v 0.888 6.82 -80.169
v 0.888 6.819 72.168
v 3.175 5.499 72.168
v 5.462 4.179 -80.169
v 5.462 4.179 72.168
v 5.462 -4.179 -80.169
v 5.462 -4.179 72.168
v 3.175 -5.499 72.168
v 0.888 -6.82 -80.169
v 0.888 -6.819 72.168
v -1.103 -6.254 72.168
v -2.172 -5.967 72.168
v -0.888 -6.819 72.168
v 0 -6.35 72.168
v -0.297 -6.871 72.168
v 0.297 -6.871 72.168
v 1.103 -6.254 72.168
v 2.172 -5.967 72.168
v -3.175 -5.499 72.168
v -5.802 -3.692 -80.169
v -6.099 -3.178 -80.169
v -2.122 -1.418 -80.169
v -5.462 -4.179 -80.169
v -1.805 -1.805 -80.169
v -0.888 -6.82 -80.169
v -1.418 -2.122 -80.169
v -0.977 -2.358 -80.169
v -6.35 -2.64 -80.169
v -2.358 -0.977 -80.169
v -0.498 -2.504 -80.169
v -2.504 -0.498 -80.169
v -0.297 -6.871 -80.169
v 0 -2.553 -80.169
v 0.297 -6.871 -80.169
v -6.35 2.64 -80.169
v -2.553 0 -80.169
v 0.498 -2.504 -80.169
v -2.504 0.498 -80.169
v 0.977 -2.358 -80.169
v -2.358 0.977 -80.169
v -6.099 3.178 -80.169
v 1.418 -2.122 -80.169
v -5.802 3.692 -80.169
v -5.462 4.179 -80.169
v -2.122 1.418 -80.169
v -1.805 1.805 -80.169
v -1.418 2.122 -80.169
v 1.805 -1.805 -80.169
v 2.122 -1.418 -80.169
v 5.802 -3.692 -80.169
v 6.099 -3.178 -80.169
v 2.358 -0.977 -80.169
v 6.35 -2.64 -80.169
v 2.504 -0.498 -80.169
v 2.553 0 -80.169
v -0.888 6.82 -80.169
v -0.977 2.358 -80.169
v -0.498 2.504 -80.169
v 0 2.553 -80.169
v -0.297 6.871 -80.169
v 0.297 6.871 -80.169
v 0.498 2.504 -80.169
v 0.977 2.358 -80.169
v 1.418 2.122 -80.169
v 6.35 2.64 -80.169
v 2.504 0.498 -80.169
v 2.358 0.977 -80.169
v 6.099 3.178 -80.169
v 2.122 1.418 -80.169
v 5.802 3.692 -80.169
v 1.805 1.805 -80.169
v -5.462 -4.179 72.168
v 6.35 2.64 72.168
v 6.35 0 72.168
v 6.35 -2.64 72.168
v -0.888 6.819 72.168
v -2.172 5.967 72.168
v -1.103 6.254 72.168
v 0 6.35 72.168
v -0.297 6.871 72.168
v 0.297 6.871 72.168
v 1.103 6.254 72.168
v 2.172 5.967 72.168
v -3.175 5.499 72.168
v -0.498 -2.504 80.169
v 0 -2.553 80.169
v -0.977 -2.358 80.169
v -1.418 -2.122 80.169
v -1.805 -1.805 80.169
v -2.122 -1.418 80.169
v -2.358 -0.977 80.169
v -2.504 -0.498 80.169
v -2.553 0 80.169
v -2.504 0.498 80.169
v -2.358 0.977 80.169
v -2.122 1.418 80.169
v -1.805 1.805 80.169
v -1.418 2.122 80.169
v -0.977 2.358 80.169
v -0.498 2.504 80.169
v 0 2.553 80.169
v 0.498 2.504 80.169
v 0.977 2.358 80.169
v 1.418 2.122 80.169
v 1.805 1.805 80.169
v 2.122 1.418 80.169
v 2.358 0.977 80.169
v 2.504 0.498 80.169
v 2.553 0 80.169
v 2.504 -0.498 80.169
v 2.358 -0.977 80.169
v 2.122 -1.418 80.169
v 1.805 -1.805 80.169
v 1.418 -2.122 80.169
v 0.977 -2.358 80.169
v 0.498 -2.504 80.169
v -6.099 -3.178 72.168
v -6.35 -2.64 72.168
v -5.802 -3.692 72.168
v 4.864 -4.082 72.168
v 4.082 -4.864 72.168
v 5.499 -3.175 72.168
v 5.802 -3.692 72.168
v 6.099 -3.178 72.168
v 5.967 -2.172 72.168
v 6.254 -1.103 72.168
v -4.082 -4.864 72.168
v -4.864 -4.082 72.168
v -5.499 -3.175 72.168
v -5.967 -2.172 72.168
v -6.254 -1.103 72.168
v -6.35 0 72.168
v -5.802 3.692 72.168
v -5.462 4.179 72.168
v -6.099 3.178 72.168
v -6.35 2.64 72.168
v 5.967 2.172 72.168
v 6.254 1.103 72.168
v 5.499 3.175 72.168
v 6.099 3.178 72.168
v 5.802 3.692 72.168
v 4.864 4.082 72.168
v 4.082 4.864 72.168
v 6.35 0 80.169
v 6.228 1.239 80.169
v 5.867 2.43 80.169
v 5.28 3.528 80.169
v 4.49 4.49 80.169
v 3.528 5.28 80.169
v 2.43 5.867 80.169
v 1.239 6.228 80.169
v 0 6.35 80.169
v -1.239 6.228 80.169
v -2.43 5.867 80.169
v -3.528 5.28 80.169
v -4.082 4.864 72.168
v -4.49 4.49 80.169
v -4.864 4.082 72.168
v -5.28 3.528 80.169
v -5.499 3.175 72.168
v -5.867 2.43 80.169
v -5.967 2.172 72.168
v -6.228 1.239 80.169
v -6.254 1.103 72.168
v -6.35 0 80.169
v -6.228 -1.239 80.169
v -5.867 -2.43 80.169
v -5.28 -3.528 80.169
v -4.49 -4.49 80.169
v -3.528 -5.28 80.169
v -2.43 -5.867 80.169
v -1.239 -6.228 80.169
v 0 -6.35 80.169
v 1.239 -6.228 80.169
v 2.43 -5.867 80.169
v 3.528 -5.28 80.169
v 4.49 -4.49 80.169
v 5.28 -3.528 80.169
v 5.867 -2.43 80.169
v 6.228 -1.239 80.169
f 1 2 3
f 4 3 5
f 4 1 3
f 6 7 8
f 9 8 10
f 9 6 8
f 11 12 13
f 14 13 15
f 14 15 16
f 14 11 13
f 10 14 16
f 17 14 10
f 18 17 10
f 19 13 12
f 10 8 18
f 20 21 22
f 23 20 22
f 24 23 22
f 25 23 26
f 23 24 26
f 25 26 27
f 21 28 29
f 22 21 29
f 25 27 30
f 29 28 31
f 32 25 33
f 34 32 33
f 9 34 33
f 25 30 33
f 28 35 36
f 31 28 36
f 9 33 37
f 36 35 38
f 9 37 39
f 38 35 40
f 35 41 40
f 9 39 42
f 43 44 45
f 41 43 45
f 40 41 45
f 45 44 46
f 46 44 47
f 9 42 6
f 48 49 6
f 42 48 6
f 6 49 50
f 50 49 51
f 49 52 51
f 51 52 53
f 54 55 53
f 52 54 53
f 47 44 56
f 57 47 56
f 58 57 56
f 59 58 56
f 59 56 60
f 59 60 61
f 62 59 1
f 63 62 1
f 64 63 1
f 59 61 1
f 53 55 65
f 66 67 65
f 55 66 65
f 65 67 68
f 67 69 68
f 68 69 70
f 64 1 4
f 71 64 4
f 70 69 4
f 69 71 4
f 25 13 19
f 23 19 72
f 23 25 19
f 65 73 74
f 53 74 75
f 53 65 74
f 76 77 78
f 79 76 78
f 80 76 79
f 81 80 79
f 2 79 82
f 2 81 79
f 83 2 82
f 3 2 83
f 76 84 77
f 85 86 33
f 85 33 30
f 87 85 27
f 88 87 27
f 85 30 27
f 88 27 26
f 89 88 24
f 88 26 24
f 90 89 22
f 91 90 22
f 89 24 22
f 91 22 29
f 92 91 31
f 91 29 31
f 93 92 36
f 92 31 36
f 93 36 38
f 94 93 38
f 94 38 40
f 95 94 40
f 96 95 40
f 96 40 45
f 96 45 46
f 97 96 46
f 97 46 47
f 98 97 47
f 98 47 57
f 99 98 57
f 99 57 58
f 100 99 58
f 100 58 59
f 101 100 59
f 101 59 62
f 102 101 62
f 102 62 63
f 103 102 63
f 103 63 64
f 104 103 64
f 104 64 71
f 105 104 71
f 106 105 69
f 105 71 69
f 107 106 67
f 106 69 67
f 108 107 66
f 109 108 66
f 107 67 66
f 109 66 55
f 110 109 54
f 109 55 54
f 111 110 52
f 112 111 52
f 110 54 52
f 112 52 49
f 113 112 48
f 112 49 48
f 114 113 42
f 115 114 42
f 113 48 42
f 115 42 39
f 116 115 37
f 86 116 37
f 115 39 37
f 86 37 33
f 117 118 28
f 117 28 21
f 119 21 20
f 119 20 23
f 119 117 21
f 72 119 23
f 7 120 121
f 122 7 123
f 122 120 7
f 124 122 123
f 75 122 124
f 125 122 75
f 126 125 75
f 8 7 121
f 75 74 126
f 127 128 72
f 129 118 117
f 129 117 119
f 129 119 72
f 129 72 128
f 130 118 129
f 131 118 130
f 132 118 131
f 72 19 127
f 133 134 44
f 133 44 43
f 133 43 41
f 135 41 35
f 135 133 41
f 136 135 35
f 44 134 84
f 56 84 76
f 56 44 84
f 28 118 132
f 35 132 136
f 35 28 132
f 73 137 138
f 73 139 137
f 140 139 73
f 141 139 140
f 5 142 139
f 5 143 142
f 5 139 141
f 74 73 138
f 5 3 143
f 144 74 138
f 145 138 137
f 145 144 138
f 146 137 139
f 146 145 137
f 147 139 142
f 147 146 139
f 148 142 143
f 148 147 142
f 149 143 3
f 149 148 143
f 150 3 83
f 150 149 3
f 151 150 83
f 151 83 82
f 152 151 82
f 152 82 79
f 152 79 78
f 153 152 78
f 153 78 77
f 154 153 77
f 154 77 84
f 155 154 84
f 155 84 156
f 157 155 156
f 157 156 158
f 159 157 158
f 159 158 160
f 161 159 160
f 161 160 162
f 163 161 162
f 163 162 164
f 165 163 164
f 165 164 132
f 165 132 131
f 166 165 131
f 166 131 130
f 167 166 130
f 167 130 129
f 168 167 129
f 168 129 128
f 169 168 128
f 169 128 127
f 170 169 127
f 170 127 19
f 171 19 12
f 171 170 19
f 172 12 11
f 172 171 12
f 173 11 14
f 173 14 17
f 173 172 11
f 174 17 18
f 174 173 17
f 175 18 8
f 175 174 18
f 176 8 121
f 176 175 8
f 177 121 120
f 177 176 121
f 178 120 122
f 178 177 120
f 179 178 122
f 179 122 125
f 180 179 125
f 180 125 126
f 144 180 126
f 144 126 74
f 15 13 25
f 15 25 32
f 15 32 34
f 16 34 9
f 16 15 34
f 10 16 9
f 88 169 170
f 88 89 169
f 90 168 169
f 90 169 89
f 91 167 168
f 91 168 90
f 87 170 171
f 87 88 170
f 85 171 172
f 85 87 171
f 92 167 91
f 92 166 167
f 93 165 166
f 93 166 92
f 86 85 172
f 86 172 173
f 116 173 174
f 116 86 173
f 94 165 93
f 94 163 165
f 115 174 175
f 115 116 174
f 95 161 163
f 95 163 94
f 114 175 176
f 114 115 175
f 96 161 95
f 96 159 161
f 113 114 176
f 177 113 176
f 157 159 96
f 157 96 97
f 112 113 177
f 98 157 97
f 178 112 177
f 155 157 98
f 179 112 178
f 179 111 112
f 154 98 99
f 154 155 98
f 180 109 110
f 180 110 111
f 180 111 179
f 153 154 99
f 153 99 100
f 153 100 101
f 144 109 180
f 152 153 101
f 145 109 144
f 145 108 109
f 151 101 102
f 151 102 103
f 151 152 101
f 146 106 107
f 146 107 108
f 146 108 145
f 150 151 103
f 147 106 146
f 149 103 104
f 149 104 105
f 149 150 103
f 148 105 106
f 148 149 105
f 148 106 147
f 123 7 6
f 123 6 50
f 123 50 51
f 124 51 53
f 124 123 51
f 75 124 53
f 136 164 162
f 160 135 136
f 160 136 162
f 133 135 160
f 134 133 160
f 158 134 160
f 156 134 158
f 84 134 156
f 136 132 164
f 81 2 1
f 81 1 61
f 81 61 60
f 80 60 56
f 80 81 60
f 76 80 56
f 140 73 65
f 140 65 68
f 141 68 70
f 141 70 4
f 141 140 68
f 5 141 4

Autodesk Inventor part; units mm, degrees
ref_plane "YZ Plane" through (0, 0, 0) normal (1, 0, 0) x (0, 1, 0)
ref_plane "XZ Plane" through (0, 0, 0) normal (0, 1, 0) x (-1, 0, 0)
ref_plane "XY Plane" through (0, 0, 0) normal (0, 0, 1) x (1, 0, 0)
sketch "Sketch1" plane through (0, 0, 0) normal (0, 0, 1) x (1, 0, 0)
  line L0 (-6.35, -3.6662) -> (-6.35, 3.6662)
  line L1 (-6.35, 3.6662) -> (0, 7.3323)
  line L2 (0, 7.3323) -> (6.35, 3.6662)
  line L3 (6.35, 3.6662) -> (6.35, -3.6662)
  line L4 (6.35, -3.6662) -> (0, -7.3323)
  line L5 (0, -7.3323) -> (-6.35, -3.6662)
  point P0 (0, 0)
  point P1 (0, 0)
  dimension "Size" = 12.7
extrude "Extrusion1" add sketch "Sketch1" along normal mid plane 160.3375
sketch "Sketch3" plane through (0, 0, 80.1688) normal (0, 0, 1) x (1, 0, 0)
  line L0 (-6.35, 3.6662) -> (0, 7.3323) construction
  line L1 (0, 7.3323) -> (6.35, 3.6662) construction
  line L2 (6.35, 3.6662) -> (6.35, -3.6662) construction
  line L3 (6.35, -3.6662) -> (0, -7.3323) construction
  line L4 (0, -7.3323) -> (-6.35, -3.6662) construction
  line L5 (-6.35, -3.6662) -> (-6.35, 3.6662) construction
  point P0 (0, 0)
hole "Hole1" at (0, 0, 80.1688) direction (0, 0, -1) diameter 5.1054 end through all
sketch "Sketch4" plane through (0, 0, 80.1688) normal (0, 0, 1) x (1, 0, 0)
  circle A0 centre (0, 0) radius 2.5527 construction
  line L0 (-6.35, 3.6662) -> (0, 7.3323) construction
  line L1 (0, 7.3323) -> (6.35, 3.6662) construction
  line L2 (6.35, 3.6662) -> (6.35, -3.6662) construction
  line L3 (6.35, -3.6662) -> (0, -7.3323) construction
  line L4 (0, -7.3323) -> (-6.35, -3.6662) construction
  line L5 (-6.35, -3.6662) -> (-6.35, 3.6662) construction
  circle A1 centre (0, 0) radius 6.8771
  circle A2 centre (0, 0) radius 8.89
  dimension "thunder" = 13.7541
  dimension "d16" = 17.78
extrude "Extrusion3" cut sketch "Sketch4" against normal through all
sketch "Sketch5" plane through (0, 0, 80.1688) normal (0, 0, 1) x (1, 0, 0)
  arc A0 (5.4616, -4.1791) -> (6.35, -2.6403) centre (0, 0) ccw projected
  line L0 (5.4616, -4.1791) -> (0.8884, -6.8194) projected
  arc A1 (-0.8884, -6.8194) -> (0.8884, -6.8194) centre (0, 0) ccw projected
  line L1 (-0.8884, -6.8194) -> (-5.4616, -4.1791) projected
  arc A2 (-6.35, -2.6403) -> (-5.4616, -4.1791) centre (0, 0) ccw projected
  line L2 (-6.35, -2.6403) -> (-6.35, 2.6403) projected
  arc A3 (-5.4616, 4.1791) -> (-6.35, 2.6403) centre (0, 0) ccw projected
  line L3 (-5.4616, 4.1791) -> (-0.8884, 6.8194) projected
  arc A4 (0.8884, 6.8194) -> (-0.8884, 6.8194) centre (0, 0) ccw projected
  line L4 (0.8884, 6.8194) -> (5.4616, 4.1791) projected
  arc A5 (6.35, 2.6403) -> (5.4616, 4.1791) centre (0, 0) ccw projected
  line L5 (6.35, 2.6403) -> (6.35, -2.6403) projected
  circle A6 centre (0, 0) radius 2.5527 projected
  circle A7 centre (0, 0) radius 6.35
  point P0 (-3.175, 5.4993)
  point P1 (3.175, 5.4993)
  point P2 (6.35, 0)
  point P3 (-6.35, 0)
  point P4 (-3.175, -5.4993)
  point P5 (3.175, -5.4993)
  dimension "d19" = 12.7
extrude "Extrusion4" cut sketch "Sketch5" against normal blind 8.001 contours L0 A7 L5 A0 | L0 A1 L1 A7 | A7 L4 A5 L5 | L1 A2 L2 A7 | A7 L3 A4 L4 | L2 A3 L3 A7
equation "\"bearing\" = 25.4"
properties part number "CL4-020" material "Aluminum 6061"
